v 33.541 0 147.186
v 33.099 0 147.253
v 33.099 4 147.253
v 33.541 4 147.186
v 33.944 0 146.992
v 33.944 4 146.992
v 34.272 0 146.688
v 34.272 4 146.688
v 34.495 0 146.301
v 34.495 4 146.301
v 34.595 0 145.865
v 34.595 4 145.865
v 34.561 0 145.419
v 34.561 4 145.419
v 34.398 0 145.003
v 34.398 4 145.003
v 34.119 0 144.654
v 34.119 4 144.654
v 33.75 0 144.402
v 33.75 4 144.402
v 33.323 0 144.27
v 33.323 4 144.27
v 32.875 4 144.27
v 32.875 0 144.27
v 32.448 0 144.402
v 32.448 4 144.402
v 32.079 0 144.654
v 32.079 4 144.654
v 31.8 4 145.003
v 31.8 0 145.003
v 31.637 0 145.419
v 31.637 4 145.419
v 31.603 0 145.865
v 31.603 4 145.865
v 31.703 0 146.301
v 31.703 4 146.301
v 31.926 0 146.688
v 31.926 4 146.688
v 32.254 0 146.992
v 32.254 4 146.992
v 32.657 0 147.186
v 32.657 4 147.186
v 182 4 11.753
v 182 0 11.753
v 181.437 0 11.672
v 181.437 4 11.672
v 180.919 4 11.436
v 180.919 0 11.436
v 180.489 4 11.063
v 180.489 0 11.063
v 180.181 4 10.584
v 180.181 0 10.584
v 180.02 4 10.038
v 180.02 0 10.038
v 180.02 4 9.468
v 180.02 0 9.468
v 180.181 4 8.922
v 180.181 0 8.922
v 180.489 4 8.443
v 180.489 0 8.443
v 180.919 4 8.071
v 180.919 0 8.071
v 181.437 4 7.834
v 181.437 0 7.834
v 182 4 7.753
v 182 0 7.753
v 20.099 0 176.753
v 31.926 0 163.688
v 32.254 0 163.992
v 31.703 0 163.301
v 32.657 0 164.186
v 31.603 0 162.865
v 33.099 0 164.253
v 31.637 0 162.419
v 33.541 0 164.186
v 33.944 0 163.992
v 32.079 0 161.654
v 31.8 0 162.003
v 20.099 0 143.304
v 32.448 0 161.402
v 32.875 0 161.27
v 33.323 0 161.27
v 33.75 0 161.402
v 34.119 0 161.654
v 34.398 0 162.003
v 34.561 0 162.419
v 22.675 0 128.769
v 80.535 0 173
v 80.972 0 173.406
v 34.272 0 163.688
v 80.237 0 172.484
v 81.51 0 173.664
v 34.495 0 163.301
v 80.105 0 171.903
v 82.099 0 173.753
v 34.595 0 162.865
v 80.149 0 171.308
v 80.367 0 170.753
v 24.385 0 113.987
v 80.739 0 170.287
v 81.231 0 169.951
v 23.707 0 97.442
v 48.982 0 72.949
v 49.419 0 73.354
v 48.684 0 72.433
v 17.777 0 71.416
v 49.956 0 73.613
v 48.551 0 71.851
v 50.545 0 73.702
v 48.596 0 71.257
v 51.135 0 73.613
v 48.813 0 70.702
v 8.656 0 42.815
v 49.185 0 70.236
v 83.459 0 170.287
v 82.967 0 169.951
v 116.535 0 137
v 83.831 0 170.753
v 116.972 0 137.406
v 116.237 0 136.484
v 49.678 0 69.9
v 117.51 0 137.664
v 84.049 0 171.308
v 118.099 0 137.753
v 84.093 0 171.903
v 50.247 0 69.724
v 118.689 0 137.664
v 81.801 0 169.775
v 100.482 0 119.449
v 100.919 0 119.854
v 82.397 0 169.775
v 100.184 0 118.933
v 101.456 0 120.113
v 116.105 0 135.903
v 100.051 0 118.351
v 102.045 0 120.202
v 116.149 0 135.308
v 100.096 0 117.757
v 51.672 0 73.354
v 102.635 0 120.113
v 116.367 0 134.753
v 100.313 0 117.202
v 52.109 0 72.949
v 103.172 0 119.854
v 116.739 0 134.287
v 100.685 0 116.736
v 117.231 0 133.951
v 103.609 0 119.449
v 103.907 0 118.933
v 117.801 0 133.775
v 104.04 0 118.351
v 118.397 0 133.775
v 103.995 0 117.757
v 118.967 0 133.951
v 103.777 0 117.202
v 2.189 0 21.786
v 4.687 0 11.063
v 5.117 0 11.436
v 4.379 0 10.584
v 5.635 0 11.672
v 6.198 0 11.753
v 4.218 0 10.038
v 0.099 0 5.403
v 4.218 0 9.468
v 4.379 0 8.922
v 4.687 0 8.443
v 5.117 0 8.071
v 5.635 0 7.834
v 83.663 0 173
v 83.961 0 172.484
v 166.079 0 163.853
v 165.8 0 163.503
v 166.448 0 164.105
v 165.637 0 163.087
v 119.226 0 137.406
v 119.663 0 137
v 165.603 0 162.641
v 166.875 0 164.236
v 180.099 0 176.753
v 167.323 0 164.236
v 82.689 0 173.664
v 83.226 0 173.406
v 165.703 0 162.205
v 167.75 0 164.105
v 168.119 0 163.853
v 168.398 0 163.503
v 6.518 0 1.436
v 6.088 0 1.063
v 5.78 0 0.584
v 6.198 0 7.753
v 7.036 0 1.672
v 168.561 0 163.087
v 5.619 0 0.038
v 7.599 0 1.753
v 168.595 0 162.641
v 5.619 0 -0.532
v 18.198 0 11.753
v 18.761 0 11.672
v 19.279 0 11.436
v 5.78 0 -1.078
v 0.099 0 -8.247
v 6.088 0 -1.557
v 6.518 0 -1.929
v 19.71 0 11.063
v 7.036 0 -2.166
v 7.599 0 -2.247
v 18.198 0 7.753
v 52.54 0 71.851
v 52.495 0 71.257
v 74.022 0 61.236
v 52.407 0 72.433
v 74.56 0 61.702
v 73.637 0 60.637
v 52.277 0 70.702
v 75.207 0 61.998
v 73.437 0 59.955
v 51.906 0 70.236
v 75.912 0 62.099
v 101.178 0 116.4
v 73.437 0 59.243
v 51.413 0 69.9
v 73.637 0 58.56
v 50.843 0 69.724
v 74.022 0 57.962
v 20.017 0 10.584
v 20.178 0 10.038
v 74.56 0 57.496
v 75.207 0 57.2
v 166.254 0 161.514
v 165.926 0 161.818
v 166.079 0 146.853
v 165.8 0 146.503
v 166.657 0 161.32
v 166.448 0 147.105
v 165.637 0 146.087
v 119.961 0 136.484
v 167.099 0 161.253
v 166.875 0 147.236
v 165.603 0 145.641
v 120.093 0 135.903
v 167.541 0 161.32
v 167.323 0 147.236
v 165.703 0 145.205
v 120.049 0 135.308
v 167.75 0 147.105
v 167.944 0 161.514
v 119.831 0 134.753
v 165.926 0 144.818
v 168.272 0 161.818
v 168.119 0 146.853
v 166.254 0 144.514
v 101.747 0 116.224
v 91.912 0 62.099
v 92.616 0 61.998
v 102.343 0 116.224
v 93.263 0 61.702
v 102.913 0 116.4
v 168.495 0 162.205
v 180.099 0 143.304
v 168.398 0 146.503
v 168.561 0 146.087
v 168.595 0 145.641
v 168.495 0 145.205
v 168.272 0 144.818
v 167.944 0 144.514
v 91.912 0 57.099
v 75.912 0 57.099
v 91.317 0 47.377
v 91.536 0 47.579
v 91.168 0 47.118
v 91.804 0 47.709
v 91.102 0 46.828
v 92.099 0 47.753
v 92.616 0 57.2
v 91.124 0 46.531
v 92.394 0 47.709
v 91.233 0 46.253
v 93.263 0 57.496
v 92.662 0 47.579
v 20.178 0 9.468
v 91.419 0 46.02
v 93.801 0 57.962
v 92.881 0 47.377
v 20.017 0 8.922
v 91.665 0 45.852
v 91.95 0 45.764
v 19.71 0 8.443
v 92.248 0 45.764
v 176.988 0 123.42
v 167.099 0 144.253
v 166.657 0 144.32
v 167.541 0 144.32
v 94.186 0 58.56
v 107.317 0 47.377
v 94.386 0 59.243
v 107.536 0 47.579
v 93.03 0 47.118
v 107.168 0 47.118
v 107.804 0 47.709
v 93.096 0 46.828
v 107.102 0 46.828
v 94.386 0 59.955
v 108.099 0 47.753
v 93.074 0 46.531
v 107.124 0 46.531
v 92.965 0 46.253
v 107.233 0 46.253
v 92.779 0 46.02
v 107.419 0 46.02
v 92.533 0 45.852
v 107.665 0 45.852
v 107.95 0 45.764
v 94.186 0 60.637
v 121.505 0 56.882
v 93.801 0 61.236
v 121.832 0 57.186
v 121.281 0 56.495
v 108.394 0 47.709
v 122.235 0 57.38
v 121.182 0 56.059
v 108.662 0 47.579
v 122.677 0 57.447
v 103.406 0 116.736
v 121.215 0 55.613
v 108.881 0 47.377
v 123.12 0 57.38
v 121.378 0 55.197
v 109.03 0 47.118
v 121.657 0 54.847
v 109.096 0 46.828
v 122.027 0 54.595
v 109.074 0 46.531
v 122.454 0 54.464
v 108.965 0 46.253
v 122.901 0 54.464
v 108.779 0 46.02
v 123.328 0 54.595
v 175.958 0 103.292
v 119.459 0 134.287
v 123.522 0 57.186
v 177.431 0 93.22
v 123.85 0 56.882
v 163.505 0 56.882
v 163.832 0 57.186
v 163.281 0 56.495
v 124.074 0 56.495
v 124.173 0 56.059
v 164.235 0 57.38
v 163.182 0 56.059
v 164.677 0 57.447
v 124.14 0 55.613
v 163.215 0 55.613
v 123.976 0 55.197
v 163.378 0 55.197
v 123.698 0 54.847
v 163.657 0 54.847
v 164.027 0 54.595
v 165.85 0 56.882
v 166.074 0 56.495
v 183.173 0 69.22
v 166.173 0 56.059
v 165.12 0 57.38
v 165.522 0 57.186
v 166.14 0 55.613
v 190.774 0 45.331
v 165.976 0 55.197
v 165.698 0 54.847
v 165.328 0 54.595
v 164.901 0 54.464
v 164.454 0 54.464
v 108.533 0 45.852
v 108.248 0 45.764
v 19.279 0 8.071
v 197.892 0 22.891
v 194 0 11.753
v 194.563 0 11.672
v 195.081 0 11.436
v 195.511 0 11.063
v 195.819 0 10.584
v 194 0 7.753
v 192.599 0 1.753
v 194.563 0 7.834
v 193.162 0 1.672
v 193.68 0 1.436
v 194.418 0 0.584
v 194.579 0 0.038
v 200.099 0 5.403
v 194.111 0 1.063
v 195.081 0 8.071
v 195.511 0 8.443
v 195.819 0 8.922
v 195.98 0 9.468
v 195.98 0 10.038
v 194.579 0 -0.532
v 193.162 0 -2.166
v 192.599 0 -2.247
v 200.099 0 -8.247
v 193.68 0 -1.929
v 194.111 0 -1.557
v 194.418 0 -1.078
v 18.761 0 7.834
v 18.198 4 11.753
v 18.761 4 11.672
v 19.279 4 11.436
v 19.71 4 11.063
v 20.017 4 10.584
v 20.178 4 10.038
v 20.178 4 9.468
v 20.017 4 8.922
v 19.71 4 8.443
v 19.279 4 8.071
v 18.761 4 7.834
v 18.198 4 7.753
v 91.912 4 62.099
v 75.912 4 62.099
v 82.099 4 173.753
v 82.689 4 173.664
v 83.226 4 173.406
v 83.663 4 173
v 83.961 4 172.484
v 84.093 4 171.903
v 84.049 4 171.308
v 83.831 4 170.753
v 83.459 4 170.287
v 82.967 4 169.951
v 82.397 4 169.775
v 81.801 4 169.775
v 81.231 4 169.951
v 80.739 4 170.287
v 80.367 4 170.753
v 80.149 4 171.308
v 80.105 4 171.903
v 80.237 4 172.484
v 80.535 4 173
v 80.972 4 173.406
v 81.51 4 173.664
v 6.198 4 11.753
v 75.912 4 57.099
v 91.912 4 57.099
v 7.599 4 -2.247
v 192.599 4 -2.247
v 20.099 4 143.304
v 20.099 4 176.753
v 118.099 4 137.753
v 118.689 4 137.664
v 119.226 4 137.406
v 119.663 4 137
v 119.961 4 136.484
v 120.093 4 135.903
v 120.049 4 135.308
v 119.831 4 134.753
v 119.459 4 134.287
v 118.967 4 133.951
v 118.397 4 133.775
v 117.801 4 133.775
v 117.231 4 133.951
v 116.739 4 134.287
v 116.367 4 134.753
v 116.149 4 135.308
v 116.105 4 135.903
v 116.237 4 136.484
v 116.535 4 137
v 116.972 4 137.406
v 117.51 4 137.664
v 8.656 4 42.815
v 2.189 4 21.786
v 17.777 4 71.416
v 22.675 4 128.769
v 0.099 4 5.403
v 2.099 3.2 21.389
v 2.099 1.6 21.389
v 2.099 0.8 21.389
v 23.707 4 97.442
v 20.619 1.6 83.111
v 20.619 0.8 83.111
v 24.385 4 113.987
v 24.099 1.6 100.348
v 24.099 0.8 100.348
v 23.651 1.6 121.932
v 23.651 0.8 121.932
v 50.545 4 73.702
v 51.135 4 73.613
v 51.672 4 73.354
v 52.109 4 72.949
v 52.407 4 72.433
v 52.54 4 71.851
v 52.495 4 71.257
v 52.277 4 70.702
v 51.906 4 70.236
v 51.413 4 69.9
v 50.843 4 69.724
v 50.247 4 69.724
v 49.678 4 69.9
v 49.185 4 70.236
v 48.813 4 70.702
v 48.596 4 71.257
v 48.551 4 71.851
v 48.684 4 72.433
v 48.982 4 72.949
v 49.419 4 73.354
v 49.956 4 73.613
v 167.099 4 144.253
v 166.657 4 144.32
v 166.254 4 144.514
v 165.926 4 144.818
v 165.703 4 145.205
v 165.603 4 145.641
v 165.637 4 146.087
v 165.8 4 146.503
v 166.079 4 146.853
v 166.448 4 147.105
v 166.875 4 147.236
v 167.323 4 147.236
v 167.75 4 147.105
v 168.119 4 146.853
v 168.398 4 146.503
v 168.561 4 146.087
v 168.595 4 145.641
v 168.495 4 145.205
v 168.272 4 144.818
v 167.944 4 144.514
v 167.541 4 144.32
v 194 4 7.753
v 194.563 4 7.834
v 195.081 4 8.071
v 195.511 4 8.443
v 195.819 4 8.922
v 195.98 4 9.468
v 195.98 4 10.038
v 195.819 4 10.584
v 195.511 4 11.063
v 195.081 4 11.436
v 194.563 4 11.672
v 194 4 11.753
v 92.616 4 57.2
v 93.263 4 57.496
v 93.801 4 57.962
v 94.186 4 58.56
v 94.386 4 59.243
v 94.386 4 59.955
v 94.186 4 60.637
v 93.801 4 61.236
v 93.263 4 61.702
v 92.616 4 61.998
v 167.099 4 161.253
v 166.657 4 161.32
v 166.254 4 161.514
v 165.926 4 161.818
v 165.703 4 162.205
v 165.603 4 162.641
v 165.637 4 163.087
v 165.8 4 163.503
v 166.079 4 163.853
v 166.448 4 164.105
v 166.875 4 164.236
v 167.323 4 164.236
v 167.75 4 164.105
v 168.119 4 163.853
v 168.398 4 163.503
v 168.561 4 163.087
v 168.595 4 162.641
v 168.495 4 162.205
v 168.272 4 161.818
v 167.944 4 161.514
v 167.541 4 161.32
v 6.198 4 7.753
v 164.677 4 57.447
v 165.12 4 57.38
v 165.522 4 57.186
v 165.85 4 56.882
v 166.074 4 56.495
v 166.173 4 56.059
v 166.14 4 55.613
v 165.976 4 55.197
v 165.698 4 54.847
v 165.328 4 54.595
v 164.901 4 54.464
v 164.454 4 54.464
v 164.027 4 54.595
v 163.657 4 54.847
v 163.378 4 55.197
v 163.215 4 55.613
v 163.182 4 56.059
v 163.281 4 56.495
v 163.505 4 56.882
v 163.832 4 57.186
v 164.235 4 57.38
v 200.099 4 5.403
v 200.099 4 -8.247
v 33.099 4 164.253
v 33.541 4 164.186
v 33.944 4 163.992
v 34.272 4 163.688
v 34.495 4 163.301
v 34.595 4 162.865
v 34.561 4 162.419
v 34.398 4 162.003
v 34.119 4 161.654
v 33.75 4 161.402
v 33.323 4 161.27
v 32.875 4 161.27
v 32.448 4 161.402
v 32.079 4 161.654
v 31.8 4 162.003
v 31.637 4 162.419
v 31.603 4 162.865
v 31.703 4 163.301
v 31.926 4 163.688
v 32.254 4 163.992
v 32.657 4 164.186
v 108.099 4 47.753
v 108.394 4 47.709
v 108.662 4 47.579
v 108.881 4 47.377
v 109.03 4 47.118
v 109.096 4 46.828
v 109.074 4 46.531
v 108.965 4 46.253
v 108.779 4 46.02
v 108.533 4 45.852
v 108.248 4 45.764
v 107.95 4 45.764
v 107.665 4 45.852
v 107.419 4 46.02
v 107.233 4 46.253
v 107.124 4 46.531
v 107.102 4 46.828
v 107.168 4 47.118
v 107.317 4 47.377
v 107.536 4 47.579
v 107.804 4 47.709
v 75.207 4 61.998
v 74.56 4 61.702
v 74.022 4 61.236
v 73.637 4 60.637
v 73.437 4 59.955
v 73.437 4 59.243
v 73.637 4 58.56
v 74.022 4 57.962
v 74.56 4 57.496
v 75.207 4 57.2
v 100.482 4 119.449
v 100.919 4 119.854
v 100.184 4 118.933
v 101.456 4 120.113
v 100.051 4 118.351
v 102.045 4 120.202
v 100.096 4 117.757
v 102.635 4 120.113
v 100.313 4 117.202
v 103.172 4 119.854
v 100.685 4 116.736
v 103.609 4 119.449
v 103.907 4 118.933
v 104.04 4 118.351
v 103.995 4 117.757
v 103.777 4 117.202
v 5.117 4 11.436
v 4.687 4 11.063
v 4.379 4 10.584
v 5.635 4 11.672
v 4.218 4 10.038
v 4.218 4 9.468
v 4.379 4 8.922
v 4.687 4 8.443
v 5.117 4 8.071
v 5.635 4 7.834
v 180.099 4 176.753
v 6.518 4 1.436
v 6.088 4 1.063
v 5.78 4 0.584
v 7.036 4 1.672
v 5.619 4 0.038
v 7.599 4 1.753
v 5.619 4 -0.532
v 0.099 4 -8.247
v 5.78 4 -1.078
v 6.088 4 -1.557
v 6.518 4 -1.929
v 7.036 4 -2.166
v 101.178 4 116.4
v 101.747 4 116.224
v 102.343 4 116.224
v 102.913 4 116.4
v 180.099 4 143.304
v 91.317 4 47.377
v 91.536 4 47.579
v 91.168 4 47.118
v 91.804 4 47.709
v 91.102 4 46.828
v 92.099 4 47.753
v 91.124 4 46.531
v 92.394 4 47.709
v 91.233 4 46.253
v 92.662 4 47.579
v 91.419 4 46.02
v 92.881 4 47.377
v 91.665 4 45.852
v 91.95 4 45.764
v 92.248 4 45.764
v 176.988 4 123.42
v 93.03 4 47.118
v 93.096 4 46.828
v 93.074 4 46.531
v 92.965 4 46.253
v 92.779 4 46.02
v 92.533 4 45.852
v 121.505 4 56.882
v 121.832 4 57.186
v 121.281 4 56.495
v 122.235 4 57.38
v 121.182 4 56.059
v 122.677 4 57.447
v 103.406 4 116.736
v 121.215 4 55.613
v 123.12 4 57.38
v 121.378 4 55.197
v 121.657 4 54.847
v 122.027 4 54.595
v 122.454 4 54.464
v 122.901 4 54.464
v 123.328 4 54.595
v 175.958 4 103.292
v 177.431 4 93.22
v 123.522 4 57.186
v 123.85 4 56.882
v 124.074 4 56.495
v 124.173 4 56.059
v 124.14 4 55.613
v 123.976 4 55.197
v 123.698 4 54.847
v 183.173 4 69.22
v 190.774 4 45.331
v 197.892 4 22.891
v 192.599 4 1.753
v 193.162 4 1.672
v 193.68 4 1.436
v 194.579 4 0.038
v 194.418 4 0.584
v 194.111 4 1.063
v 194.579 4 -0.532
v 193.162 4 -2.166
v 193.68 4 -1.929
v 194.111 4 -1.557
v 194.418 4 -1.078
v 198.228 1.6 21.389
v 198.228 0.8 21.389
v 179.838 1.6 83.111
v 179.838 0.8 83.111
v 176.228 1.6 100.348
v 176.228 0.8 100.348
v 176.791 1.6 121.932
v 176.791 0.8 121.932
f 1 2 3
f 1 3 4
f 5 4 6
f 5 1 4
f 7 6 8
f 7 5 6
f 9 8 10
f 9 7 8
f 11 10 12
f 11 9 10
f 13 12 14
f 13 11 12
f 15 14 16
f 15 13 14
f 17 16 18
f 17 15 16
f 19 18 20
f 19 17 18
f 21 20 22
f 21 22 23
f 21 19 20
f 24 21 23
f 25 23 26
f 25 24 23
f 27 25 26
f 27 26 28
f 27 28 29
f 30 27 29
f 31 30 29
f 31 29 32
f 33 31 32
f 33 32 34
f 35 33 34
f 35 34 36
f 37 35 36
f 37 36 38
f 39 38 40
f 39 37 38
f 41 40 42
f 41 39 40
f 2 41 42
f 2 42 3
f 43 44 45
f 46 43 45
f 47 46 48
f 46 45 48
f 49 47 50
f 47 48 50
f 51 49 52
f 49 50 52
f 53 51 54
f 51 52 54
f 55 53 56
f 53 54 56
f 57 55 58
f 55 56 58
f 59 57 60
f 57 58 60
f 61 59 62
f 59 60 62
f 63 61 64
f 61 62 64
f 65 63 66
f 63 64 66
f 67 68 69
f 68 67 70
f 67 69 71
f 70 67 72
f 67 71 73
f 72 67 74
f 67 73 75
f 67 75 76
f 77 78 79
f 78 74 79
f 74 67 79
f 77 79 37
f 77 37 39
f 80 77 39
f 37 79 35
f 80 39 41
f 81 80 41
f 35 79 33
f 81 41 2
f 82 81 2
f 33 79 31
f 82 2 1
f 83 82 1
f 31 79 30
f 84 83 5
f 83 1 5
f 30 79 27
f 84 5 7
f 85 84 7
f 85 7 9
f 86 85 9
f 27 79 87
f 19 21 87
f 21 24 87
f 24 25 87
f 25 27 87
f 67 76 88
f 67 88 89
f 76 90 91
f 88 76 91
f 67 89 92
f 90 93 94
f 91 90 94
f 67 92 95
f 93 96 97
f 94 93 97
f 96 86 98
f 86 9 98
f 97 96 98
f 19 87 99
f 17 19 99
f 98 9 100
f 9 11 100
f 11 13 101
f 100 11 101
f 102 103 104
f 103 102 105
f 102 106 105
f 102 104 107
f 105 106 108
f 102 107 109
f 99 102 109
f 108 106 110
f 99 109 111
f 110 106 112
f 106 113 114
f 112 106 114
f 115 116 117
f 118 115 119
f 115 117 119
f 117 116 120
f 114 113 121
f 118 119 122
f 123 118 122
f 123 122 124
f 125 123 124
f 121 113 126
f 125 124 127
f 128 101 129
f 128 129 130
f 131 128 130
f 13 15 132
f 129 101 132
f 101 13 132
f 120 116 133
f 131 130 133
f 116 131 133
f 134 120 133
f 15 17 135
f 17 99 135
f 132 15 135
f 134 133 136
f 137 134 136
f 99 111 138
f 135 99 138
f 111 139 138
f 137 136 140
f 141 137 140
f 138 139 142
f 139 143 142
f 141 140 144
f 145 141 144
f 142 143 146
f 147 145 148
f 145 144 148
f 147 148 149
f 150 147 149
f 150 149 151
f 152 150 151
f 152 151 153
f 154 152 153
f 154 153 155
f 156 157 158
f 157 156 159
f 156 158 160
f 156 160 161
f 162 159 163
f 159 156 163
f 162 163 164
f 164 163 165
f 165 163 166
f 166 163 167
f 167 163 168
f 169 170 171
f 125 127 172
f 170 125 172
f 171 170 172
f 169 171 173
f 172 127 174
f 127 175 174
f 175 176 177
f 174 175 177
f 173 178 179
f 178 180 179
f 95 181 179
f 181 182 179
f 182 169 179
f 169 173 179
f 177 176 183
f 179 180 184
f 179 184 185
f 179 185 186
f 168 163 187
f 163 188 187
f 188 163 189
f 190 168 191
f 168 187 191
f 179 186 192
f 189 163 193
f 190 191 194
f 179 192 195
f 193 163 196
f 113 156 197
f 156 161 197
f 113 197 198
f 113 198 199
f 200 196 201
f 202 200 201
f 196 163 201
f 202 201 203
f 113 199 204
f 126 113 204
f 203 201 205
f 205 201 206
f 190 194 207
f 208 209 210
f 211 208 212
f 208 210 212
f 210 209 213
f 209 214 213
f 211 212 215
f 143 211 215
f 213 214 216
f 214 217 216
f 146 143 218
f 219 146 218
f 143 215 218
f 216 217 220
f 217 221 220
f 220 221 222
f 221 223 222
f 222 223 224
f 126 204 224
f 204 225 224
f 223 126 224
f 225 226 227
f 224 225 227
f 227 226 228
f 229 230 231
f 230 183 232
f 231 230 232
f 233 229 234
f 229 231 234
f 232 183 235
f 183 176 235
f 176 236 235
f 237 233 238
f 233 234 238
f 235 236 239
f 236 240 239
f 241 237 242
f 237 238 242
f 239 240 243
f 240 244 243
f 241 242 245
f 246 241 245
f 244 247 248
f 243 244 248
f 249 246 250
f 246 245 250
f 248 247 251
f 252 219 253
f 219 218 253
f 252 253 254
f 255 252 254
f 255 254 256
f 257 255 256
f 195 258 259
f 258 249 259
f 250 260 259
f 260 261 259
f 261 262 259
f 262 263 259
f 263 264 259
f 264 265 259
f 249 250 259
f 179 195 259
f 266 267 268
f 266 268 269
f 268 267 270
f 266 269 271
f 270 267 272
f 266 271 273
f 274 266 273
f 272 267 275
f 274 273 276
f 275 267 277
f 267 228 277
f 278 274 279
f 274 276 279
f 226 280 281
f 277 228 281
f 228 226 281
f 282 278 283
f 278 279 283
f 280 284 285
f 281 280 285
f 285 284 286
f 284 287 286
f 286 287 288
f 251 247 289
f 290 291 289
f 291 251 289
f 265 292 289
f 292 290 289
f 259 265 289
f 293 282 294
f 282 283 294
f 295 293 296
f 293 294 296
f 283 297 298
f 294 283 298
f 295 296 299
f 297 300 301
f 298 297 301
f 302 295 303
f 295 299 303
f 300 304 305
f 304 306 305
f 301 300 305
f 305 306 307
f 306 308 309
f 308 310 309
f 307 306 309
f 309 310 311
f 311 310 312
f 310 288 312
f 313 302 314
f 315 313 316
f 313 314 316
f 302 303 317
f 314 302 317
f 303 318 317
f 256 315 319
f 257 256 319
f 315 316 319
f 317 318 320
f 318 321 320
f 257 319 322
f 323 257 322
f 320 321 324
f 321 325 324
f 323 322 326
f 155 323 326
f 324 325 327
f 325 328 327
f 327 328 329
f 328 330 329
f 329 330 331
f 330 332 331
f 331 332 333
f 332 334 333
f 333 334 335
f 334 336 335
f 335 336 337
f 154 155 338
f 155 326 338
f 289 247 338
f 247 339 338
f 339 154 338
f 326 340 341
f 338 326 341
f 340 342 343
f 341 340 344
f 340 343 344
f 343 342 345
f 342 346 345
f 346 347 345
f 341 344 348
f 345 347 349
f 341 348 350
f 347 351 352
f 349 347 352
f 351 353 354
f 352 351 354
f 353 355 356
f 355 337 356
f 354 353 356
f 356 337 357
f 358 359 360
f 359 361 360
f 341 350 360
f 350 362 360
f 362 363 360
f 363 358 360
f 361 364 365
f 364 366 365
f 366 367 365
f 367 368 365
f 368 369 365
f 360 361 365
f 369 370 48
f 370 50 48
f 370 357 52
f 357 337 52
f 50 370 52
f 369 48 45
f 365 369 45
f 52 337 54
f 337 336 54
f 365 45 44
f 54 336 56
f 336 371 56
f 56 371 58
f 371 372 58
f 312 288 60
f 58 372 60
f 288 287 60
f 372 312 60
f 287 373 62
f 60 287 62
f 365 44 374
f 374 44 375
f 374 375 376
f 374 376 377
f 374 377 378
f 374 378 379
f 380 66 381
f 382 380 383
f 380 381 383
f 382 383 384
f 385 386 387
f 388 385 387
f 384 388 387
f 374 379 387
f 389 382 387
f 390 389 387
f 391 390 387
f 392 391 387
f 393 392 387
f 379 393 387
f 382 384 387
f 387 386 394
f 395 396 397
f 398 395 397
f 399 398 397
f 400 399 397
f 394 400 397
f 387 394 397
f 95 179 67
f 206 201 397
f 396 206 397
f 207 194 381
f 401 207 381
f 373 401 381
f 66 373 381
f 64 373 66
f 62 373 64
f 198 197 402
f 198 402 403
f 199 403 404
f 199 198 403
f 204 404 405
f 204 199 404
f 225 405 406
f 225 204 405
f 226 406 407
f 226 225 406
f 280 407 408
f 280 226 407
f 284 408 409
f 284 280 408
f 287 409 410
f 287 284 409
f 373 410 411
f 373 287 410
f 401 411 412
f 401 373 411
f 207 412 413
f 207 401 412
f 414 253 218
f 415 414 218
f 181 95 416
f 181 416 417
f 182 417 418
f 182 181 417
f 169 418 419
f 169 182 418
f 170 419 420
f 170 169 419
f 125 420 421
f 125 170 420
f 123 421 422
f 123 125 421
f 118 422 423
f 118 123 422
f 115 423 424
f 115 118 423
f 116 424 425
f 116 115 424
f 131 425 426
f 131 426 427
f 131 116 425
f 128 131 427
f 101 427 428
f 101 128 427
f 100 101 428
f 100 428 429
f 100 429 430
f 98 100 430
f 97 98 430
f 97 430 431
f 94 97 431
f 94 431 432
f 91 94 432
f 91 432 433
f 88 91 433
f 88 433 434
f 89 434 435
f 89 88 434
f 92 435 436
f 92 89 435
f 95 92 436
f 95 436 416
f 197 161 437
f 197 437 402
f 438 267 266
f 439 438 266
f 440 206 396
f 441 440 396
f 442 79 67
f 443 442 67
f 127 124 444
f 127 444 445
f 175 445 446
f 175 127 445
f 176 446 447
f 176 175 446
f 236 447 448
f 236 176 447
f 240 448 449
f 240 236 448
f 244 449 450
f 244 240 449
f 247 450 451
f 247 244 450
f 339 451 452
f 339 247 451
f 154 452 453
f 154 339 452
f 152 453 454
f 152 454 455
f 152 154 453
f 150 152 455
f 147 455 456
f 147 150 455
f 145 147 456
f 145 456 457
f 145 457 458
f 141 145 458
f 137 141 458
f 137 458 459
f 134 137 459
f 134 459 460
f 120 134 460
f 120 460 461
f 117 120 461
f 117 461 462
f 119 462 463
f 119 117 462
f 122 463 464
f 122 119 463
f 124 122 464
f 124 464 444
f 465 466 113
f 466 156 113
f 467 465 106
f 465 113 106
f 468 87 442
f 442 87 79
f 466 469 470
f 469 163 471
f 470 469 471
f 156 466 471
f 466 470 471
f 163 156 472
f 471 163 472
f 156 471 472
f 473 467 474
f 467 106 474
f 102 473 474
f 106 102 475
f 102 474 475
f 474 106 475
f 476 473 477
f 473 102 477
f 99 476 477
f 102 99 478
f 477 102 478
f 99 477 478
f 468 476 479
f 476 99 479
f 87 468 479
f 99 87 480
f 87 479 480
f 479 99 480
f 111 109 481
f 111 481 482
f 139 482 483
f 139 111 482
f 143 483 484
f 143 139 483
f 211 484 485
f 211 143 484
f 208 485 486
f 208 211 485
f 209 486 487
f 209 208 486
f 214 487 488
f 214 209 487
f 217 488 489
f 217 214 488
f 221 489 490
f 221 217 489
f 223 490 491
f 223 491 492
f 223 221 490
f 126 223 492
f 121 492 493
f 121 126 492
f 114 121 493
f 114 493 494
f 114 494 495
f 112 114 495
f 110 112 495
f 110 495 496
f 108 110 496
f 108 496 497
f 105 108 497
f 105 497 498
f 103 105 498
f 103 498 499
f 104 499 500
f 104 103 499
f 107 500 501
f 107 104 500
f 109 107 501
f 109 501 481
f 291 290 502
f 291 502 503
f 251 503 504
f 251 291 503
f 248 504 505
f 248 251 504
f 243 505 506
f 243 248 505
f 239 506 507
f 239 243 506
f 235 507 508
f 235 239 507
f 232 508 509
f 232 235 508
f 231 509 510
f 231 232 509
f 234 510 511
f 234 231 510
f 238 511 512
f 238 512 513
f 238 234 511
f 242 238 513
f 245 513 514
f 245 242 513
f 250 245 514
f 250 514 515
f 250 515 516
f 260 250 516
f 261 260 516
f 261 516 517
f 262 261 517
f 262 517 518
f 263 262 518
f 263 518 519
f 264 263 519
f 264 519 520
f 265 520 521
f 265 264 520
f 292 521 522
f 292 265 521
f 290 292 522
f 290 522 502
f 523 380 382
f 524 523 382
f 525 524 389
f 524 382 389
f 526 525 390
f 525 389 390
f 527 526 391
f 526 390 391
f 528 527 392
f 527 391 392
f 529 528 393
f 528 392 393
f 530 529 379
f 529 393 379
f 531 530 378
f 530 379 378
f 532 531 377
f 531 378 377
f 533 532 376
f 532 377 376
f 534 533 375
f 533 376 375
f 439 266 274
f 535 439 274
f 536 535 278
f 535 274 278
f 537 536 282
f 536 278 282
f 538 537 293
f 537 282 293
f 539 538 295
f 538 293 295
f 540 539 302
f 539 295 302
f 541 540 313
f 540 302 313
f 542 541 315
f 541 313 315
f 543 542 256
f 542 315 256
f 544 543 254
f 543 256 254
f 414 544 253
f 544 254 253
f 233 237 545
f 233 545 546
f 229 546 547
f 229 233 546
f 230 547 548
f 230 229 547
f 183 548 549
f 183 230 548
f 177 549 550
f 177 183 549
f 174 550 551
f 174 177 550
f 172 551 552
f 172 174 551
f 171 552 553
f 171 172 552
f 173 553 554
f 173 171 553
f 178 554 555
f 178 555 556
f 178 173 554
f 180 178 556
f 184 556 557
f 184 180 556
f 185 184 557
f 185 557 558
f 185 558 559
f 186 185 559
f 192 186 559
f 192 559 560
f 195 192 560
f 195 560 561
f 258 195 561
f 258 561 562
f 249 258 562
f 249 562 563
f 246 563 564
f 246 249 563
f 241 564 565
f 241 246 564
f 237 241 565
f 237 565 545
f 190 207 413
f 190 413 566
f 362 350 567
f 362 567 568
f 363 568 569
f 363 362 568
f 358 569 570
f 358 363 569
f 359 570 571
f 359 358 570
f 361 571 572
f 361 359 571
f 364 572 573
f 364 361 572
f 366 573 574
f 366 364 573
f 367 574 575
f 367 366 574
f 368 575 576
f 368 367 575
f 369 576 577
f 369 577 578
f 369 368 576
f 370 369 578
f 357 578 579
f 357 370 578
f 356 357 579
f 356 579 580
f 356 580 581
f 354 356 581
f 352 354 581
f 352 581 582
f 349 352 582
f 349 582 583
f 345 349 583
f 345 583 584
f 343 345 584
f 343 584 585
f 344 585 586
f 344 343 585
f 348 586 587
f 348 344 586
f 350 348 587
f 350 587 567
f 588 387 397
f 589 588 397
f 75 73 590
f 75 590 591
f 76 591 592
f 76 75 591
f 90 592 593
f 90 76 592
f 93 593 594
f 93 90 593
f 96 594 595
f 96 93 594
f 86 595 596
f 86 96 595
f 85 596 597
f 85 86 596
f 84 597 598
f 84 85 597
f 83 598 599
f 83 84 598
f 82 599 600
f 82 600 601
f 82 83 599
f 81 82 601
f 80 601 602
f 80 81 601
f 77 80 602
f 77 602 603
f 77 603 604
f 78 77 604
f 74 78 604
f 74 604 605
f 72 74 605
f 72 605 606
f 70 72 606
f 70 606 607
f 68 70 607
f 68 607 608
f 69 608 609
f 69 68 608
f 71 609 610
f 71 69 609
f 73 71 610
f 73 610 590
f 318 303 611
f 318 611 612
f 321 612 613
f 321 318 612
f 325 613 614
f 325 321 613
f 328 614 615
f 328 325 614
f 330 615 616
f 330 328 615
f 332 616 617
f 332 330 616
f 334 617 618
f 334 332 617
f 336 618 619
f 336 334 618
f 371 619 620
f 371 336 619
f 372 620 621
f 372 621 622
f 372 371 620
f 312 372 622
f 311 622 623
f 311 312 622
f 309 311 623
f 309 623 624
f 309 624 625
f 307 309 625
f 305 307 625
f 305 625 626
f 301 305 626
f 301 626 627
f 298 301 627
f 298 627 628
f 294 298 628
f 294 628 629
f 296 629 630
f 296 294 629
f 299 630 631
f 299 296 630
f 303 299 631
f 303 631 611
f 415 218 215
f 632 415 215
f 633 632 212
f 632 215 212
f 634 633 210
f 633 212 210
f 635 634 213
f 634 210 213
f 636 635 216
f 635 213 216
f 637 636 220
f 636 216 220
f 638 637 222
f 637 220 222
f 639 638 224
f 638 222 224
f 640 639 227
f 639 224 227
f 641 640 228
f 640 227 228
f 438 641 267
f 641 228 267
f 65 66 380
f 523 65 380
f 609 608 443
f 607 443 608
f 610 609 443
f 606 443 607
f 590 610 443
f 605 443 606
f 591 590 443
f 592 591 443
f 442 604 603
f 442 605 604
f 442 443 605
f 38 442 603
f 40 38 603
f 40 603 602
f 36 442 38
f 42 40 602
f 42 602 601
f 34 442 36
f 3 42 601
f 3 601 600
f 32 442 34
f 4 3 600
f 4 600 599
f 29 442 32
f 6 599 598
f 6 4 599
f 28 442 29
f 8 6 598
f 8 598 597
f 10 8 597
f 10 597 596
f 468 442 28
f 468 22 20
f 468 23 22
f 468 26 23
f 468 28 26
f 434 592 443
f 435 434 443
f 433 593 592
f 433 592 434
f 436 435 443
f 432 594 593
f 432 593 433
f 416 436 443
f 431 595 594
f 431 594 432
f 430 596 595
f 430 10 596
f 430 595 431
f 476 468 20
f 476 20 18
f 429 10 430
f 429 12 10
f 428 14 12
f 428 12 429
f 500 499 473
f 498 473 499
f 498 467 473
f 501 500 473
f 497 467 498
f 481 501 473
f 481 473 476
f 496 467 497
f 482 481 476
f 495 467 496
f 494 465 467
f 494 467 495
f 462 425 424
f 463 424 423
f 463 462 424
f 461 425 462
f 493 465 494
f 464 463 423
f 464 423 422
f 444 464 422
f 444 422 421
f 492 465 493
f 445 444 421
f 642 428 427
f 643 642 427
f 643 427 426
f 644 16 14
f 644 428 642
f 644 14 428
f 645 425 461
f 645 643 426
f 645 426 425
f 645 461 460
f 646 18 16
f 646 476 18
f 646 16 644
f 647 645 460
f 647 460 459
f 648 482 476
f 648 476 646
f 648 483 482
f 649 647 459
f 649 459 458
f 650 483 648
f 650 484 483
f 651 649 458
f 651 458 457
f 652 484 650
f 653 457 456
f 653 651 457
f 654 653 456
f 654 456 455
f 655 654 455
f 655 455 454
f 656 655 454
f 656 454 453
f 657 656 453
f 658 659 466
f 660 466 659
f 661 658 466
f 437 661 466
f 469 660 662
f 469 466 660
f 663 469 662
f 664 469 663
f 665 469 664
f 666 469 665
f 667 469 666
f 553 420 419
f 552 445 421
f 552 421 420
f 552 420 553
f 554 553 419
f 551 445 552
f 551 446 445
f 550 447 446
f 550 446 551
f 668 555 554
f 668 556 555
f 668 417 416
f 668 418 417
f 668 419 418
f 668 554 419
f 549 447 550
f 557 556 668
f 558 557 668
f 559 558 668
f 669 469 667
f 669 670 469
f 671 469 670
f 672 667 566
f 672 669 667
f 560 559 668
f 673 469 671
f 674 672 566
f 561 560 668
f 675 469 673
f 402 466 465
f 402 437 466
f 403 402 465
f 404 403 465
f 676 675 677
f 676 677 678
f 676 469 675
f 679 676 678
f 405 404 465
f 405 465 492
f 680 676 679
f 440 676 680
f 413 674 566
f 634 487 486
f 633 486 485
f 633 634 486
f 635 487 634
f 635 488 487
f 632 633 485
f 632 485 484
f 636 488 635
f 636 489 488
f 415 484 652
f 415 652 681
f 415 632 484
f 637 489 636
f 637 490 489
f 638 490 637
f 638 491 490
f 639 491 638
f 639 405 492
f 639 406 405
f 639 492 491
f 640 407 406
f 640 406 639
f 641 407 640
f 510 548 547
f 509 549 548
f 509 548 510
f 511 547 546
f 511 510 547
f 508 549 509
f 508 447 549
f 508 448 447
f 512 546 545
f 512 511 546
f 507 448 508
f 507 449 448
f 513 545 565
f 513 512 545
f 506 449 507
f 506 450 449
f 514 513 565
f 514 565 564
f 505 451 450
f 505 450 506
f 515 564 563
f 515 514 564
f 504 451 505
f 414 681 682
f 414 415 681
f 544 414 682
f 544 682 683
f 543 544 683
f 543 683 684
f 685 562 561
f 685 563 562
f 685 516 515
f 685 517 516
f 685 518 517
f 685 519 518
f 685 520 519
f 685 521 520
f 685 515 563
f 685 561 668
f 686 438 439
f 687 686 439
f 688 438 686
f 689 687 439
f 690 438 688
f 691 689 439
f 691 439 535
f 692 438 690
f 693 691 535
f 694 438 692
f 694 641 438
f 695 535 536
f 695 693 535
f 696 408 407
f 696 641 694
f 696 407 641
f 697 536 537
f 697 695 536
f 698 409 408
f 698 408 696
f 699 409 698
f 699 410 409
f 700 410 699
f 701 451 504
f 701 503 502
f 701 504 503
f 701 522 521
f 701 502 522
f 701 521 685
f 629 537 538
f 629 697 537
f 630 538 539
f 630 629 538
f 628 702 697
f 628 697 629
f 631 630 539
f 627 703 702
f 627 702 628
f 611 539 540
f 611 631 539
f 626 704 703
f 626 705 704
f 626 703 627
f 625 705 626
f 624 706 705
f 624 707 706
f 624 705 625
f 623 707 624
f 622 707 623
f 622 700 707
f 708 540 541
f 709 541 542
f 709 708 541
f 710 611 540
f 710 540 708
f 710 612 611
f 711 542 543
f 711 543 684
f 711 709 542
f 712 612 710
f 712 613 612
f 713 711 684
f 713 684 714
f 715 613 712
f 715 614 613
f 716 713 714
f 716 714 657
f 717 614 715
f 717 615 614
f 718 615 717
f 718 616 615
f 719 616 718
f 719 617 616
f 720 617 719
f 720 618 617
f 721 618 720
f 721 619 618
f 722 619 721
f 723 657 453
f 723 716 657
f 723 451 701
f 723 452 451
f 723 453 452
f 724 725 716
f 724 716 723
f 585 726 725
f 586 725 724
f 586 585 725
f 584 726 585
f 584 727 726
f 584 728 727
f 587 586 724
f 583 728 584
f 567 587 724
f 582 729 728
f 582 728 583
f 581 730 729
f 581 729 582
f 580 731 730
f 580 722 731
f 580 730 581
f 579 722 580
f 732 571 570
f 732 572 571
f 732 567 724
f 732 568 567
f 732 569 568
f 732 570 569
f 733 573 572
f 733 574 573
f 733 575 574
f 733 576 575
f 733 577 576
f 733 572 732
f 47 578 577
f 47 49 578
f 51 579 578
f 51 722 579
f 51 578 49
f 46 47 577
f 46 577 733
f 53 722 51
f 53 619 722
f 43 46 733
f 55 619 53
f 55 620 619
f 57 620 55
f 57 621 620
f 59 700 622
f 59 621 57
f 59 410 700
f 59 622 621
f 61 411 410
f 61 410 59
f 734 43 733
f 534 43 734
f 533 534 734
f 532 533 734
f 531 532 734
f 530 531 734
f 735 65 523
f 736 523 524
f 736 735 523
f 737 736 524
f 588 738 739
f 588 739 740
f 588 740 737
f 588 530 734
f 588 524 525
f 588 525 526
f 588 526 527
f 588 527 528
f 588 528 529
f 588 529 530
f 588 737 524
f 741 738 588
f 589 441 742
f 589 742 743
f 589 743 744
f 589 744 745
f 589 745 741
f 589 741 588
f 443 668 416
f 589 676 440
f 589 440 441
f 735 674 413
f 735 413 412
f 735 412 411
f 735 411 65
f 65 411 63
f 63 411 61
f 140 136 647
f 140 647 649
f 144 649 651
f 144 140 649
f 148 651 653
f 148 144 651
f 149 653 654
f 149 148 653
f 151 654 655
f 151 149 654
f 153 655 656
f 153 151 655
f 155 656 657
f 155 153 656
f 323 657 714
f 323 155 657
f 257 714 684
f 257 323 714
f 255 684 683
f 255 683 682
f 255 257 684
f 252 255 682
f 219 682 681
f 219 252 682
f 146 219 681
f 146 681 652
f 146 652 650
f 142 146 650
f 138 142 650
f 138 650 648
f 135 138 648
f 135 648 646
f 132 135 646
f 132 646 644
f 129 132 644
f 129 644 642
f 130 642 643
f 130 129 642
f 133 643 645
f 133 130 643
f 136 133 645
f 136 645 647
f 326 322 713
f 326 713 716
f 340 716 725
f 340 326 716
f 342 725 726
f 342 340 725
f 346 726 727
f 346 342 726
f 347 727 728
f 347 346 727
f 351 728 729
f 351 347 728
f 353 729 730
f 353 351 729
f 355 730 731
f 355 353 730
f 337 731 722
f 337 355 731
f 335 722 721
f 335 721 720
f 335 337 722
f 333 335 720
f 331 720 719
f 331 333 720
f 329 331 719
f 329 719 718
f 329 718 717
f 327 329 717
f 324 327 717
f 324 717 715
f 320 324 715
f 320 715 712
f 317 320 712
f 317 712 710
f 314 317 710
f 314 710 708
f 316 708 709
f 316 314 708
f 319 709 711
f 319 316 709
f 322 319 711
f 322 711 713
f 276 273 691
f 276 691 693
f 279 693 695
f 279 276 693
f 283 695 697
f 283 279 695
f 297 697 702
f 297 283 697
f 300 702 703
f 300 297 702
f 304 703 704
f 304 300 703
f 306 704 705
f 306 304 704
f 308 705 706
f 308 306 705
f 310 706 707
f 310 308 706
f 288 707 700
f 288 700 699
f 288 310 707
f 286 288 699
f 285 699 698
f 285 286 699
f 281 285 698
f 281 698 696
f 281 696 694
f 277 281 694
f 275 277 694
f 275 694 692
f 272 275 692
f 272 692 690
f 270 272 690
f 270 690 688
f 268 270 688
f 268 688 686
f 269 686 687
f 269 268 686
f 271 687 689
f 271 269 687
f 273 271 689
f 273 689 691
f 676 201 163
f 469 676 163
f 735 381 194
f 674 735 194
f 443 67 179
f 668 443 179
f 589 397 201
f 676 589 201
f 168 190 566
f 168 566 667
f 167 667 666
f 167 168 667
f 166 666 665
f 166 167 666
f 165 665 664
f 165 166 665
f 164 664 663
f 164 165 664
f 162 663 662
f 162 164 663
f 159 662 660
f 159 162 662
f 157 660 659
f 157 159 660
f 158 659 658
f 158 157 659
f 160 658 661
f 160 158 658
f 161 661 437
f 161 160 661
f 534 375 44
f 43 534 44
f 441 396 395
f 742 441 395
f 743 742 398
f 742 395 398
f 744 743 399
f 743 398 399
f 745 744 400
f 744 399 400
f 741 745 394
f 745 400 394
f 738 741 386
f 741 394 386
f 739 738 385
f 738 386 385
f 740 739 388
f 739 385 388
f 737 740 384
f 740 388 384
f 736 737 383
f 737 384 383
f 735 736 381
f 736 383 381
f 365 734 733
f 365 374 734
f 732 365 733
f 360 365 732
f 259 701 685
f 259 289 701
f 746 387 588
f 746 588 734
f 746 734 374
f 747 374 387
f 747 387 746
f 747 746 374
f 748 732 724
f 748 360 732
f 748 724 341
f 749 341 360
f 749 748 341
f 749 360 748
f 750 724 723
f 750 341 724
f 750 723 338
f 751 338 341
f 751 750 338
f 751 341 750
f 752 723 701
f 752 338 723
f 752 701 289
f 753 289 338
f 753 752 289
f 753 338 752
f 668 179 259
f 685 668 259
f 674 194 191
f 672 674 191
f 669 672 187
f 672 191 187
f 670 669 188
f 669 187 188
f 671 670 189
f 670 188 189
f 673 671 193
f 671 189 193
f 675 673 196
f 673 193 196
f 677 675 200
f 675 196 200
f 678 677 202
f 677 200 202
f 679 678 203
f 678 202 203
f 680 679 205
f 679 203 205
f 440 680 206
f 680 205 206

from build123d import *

# Parameters (mm, degrees)
ESQUISSE1_R        = 1.5
ESQUISSE1_R_2      = 1
ESQUISSE1_R_3      = 2
BOSS_EXTRU_1_DEPTH = 4


with BuildPart() as part:
    # Esquisse1 → Boss.-Extru.1 (new body)
    with BuildSketch(Plane(origin=(0, 0, 0), x_dir=(1, 0, 0), z_dir=(0, 1, 0))):
        with BuildLine():
            Line((20.099012054, -176.753119553), (180.099012054, -176.753119553))
            Line((180.099012054, -176.753119553), (180.099012054, -143.304210871))
            add(Edge.make_bspline(
                [(200.099012054, -5.402601665), (200.027324087, -10.863493838), (197.583796942, -30.094661829), (186.072485669, -54.954429671), (180.370262256, -81.651562253), (173.133805108, -108.569720083), (178.097171518, -129.349130809), (180.099012054, -143.304210871)],
                knots=[0.01165801, 0.01165801, 0.01165801, 0.01165801, 0.124408467, 0.420109799, 0.574806268, 0.697902863, 1, 1, 1, 1], degree=3))
            Line((200.099012054, -5.402601665), (200.099012054, 8.246880447))
            Line((200.099012054, 8.246880447), (0.099012054, 8.246880447))
            Line((0.099012054, 8.246880447), (0.099012054, -5.402601665))
            add(Edge.make_bspline(
                [(0.099012054, -5.402601665), (0.170700021, -10.863493838), (2.927056594, -30.094661829), (14.083581709, -54.954429671), (20.192714137, -81.651562253), (26.973296377, -108.569720083), (22.623790852, -129.349130809), (20.099012054, -143.304210871)],
                knots=[0.01165801, 0.01165801, 0.01165801, 0.01165801, 0.124408467, 0.420109799, 0.574806268, 0.697902863, 1, 1, 1, 1], degree=3))
            Line((20.099012054, -143.304210871), (20.099012054, -176.753119553))
        make_face()
        with Locations(Location((33.099012054, -145.753119553, 0), (0, 0, 270))):
            Circle(ESQUISSE1_R, mode=Mode.SUBTRACT)
        with Locations(Location((33.099012054, -162.753119553, 0), (0, 0, 270))):
            Circle(ESQUISSE1_R, mode=Mode.SUBTRACT)
        with Locations(Location((167.099012054, -162.753119553, 0), (0, 0, 90))):
            Circle(ESQUISSE1_R, mode=Mode.SUBTRACT)
        with Locations(Location((167.099012054, -145.753119553, 0), (0, 0, 90))):
            Circle(ESQUISSE1_R, mode=Mode.SUBTRACT)
        with Locations(Location((92.099012054, -46.753119553, 0), (0, 0, 270))):
            Circle(ESQUISSE1_R_2, mode=Mode.SUBTRACT)
        with Locations(Location((108.099012054, -46.753119553, 0), (0, 0, 270))):
            Circle(ESQUISSE1_R_2, mode=Mode.SUBTRACT)
        with Locations(Location((82.099012054, -171.753119553, 0), (0, 0, 270))):
            Circle(ESQUISSE1_R_3, mode=Mode.SUBTRACT)
        with Locations(Location((118.099012054, -135.753119553, 0), (0, 0, 270))):
            Circle(ESQUISSE1_R_3, mode=Mode.SUBTRACT)
        with Locations(Location((164.677408292, -55.946819434, 0), (0, 0, 270))):
            Circle(ESQUISSE1_R, mode=Mode.SUBTRACT)
        with Locations(Location((122.677408292, -55.946819434, 0), (0, 0, 270))):
            Circle(ESQUISSE1_R, mode=Mode.SUBTRACT)
        with Locations(Location((50.545382216, -71.701846064, 0), (0, 0, 270))):
            Circle(ESQUISSE1_R_3, mode=Mode.SUBTRACT)
        with Locations(Location((102.045382216, -118.201846064, 0), (0, 0, 270))):
            Circle(ESQUISSE1_R_3, mode=Mode.SUBTRACT)
        with BuildLine():
            Line((7.599012054, 2.246880447), (192.599012054, 2.246880447))
            ThreePointArc((192.599012054, 2.246880447), (194.599012054, 0.246880447), (192.599012054, -1.753119553))
            Line((192.599012054, -1.753119553), (7.599012054, -1.753119553))
            ThreePointArc((7.599012054, -1.753119553), (5.599012054, 0.246880447), (7.599012054, 2.246880447))
        make_face(mode=Mode.SUBTRACT)
        with BuildLine():
            Line((182, -7.753119553), (194, -7.753119553))
            ThreePointArc((194, -7.753119553), (196, -9.753119553), (194, -11.753119553))
            Line((194, -11.753119553), (182, -11.753119553))
            ThreePointArc((182, -11.753119553), (180, -9.753119553), (182, -7.753119553))
        make_face(mode=Mode.SUBTRACT)
        with BuildLine():
            Line((18.198024108, -7.753119553), (6.198024108, -7.753119553))
            ThreePointArc((6.198024108, -7.753119553), (4.198024108, -9.753119553), (6.198024108, -11.753119553))
            Line((6.198024108, -11.753119553), (18.198024108, -11.753119553))
            ThreePointArc((18.198024108, -11.753119553), (20.198024108, -9.753119553), (18.198024108, -7.753119553))
        make_face(mode=Mode.SUBTRACT)
        with BuildLine():
            Line((75.911540887, -57.098867648), (91.911540887, -57.098867648))
            ThreePointArc((91.911540887, -57.098867648), (94.411540887, -59.598867648), (91.911540887, -62.098867648))
            Line((91.911540887, -62.098867648), (75.911540887, -62.098867648))
            ThreePointArc((75.911540887, -62.098867648), (73.411540887, -59.598867648), (75.911540887, -57.098867648))
        make_face(mode=Mode.SUBTRACT)
    extrude(amount=BOSS_EXTRU_1_DEPTH)


solid = part.part
